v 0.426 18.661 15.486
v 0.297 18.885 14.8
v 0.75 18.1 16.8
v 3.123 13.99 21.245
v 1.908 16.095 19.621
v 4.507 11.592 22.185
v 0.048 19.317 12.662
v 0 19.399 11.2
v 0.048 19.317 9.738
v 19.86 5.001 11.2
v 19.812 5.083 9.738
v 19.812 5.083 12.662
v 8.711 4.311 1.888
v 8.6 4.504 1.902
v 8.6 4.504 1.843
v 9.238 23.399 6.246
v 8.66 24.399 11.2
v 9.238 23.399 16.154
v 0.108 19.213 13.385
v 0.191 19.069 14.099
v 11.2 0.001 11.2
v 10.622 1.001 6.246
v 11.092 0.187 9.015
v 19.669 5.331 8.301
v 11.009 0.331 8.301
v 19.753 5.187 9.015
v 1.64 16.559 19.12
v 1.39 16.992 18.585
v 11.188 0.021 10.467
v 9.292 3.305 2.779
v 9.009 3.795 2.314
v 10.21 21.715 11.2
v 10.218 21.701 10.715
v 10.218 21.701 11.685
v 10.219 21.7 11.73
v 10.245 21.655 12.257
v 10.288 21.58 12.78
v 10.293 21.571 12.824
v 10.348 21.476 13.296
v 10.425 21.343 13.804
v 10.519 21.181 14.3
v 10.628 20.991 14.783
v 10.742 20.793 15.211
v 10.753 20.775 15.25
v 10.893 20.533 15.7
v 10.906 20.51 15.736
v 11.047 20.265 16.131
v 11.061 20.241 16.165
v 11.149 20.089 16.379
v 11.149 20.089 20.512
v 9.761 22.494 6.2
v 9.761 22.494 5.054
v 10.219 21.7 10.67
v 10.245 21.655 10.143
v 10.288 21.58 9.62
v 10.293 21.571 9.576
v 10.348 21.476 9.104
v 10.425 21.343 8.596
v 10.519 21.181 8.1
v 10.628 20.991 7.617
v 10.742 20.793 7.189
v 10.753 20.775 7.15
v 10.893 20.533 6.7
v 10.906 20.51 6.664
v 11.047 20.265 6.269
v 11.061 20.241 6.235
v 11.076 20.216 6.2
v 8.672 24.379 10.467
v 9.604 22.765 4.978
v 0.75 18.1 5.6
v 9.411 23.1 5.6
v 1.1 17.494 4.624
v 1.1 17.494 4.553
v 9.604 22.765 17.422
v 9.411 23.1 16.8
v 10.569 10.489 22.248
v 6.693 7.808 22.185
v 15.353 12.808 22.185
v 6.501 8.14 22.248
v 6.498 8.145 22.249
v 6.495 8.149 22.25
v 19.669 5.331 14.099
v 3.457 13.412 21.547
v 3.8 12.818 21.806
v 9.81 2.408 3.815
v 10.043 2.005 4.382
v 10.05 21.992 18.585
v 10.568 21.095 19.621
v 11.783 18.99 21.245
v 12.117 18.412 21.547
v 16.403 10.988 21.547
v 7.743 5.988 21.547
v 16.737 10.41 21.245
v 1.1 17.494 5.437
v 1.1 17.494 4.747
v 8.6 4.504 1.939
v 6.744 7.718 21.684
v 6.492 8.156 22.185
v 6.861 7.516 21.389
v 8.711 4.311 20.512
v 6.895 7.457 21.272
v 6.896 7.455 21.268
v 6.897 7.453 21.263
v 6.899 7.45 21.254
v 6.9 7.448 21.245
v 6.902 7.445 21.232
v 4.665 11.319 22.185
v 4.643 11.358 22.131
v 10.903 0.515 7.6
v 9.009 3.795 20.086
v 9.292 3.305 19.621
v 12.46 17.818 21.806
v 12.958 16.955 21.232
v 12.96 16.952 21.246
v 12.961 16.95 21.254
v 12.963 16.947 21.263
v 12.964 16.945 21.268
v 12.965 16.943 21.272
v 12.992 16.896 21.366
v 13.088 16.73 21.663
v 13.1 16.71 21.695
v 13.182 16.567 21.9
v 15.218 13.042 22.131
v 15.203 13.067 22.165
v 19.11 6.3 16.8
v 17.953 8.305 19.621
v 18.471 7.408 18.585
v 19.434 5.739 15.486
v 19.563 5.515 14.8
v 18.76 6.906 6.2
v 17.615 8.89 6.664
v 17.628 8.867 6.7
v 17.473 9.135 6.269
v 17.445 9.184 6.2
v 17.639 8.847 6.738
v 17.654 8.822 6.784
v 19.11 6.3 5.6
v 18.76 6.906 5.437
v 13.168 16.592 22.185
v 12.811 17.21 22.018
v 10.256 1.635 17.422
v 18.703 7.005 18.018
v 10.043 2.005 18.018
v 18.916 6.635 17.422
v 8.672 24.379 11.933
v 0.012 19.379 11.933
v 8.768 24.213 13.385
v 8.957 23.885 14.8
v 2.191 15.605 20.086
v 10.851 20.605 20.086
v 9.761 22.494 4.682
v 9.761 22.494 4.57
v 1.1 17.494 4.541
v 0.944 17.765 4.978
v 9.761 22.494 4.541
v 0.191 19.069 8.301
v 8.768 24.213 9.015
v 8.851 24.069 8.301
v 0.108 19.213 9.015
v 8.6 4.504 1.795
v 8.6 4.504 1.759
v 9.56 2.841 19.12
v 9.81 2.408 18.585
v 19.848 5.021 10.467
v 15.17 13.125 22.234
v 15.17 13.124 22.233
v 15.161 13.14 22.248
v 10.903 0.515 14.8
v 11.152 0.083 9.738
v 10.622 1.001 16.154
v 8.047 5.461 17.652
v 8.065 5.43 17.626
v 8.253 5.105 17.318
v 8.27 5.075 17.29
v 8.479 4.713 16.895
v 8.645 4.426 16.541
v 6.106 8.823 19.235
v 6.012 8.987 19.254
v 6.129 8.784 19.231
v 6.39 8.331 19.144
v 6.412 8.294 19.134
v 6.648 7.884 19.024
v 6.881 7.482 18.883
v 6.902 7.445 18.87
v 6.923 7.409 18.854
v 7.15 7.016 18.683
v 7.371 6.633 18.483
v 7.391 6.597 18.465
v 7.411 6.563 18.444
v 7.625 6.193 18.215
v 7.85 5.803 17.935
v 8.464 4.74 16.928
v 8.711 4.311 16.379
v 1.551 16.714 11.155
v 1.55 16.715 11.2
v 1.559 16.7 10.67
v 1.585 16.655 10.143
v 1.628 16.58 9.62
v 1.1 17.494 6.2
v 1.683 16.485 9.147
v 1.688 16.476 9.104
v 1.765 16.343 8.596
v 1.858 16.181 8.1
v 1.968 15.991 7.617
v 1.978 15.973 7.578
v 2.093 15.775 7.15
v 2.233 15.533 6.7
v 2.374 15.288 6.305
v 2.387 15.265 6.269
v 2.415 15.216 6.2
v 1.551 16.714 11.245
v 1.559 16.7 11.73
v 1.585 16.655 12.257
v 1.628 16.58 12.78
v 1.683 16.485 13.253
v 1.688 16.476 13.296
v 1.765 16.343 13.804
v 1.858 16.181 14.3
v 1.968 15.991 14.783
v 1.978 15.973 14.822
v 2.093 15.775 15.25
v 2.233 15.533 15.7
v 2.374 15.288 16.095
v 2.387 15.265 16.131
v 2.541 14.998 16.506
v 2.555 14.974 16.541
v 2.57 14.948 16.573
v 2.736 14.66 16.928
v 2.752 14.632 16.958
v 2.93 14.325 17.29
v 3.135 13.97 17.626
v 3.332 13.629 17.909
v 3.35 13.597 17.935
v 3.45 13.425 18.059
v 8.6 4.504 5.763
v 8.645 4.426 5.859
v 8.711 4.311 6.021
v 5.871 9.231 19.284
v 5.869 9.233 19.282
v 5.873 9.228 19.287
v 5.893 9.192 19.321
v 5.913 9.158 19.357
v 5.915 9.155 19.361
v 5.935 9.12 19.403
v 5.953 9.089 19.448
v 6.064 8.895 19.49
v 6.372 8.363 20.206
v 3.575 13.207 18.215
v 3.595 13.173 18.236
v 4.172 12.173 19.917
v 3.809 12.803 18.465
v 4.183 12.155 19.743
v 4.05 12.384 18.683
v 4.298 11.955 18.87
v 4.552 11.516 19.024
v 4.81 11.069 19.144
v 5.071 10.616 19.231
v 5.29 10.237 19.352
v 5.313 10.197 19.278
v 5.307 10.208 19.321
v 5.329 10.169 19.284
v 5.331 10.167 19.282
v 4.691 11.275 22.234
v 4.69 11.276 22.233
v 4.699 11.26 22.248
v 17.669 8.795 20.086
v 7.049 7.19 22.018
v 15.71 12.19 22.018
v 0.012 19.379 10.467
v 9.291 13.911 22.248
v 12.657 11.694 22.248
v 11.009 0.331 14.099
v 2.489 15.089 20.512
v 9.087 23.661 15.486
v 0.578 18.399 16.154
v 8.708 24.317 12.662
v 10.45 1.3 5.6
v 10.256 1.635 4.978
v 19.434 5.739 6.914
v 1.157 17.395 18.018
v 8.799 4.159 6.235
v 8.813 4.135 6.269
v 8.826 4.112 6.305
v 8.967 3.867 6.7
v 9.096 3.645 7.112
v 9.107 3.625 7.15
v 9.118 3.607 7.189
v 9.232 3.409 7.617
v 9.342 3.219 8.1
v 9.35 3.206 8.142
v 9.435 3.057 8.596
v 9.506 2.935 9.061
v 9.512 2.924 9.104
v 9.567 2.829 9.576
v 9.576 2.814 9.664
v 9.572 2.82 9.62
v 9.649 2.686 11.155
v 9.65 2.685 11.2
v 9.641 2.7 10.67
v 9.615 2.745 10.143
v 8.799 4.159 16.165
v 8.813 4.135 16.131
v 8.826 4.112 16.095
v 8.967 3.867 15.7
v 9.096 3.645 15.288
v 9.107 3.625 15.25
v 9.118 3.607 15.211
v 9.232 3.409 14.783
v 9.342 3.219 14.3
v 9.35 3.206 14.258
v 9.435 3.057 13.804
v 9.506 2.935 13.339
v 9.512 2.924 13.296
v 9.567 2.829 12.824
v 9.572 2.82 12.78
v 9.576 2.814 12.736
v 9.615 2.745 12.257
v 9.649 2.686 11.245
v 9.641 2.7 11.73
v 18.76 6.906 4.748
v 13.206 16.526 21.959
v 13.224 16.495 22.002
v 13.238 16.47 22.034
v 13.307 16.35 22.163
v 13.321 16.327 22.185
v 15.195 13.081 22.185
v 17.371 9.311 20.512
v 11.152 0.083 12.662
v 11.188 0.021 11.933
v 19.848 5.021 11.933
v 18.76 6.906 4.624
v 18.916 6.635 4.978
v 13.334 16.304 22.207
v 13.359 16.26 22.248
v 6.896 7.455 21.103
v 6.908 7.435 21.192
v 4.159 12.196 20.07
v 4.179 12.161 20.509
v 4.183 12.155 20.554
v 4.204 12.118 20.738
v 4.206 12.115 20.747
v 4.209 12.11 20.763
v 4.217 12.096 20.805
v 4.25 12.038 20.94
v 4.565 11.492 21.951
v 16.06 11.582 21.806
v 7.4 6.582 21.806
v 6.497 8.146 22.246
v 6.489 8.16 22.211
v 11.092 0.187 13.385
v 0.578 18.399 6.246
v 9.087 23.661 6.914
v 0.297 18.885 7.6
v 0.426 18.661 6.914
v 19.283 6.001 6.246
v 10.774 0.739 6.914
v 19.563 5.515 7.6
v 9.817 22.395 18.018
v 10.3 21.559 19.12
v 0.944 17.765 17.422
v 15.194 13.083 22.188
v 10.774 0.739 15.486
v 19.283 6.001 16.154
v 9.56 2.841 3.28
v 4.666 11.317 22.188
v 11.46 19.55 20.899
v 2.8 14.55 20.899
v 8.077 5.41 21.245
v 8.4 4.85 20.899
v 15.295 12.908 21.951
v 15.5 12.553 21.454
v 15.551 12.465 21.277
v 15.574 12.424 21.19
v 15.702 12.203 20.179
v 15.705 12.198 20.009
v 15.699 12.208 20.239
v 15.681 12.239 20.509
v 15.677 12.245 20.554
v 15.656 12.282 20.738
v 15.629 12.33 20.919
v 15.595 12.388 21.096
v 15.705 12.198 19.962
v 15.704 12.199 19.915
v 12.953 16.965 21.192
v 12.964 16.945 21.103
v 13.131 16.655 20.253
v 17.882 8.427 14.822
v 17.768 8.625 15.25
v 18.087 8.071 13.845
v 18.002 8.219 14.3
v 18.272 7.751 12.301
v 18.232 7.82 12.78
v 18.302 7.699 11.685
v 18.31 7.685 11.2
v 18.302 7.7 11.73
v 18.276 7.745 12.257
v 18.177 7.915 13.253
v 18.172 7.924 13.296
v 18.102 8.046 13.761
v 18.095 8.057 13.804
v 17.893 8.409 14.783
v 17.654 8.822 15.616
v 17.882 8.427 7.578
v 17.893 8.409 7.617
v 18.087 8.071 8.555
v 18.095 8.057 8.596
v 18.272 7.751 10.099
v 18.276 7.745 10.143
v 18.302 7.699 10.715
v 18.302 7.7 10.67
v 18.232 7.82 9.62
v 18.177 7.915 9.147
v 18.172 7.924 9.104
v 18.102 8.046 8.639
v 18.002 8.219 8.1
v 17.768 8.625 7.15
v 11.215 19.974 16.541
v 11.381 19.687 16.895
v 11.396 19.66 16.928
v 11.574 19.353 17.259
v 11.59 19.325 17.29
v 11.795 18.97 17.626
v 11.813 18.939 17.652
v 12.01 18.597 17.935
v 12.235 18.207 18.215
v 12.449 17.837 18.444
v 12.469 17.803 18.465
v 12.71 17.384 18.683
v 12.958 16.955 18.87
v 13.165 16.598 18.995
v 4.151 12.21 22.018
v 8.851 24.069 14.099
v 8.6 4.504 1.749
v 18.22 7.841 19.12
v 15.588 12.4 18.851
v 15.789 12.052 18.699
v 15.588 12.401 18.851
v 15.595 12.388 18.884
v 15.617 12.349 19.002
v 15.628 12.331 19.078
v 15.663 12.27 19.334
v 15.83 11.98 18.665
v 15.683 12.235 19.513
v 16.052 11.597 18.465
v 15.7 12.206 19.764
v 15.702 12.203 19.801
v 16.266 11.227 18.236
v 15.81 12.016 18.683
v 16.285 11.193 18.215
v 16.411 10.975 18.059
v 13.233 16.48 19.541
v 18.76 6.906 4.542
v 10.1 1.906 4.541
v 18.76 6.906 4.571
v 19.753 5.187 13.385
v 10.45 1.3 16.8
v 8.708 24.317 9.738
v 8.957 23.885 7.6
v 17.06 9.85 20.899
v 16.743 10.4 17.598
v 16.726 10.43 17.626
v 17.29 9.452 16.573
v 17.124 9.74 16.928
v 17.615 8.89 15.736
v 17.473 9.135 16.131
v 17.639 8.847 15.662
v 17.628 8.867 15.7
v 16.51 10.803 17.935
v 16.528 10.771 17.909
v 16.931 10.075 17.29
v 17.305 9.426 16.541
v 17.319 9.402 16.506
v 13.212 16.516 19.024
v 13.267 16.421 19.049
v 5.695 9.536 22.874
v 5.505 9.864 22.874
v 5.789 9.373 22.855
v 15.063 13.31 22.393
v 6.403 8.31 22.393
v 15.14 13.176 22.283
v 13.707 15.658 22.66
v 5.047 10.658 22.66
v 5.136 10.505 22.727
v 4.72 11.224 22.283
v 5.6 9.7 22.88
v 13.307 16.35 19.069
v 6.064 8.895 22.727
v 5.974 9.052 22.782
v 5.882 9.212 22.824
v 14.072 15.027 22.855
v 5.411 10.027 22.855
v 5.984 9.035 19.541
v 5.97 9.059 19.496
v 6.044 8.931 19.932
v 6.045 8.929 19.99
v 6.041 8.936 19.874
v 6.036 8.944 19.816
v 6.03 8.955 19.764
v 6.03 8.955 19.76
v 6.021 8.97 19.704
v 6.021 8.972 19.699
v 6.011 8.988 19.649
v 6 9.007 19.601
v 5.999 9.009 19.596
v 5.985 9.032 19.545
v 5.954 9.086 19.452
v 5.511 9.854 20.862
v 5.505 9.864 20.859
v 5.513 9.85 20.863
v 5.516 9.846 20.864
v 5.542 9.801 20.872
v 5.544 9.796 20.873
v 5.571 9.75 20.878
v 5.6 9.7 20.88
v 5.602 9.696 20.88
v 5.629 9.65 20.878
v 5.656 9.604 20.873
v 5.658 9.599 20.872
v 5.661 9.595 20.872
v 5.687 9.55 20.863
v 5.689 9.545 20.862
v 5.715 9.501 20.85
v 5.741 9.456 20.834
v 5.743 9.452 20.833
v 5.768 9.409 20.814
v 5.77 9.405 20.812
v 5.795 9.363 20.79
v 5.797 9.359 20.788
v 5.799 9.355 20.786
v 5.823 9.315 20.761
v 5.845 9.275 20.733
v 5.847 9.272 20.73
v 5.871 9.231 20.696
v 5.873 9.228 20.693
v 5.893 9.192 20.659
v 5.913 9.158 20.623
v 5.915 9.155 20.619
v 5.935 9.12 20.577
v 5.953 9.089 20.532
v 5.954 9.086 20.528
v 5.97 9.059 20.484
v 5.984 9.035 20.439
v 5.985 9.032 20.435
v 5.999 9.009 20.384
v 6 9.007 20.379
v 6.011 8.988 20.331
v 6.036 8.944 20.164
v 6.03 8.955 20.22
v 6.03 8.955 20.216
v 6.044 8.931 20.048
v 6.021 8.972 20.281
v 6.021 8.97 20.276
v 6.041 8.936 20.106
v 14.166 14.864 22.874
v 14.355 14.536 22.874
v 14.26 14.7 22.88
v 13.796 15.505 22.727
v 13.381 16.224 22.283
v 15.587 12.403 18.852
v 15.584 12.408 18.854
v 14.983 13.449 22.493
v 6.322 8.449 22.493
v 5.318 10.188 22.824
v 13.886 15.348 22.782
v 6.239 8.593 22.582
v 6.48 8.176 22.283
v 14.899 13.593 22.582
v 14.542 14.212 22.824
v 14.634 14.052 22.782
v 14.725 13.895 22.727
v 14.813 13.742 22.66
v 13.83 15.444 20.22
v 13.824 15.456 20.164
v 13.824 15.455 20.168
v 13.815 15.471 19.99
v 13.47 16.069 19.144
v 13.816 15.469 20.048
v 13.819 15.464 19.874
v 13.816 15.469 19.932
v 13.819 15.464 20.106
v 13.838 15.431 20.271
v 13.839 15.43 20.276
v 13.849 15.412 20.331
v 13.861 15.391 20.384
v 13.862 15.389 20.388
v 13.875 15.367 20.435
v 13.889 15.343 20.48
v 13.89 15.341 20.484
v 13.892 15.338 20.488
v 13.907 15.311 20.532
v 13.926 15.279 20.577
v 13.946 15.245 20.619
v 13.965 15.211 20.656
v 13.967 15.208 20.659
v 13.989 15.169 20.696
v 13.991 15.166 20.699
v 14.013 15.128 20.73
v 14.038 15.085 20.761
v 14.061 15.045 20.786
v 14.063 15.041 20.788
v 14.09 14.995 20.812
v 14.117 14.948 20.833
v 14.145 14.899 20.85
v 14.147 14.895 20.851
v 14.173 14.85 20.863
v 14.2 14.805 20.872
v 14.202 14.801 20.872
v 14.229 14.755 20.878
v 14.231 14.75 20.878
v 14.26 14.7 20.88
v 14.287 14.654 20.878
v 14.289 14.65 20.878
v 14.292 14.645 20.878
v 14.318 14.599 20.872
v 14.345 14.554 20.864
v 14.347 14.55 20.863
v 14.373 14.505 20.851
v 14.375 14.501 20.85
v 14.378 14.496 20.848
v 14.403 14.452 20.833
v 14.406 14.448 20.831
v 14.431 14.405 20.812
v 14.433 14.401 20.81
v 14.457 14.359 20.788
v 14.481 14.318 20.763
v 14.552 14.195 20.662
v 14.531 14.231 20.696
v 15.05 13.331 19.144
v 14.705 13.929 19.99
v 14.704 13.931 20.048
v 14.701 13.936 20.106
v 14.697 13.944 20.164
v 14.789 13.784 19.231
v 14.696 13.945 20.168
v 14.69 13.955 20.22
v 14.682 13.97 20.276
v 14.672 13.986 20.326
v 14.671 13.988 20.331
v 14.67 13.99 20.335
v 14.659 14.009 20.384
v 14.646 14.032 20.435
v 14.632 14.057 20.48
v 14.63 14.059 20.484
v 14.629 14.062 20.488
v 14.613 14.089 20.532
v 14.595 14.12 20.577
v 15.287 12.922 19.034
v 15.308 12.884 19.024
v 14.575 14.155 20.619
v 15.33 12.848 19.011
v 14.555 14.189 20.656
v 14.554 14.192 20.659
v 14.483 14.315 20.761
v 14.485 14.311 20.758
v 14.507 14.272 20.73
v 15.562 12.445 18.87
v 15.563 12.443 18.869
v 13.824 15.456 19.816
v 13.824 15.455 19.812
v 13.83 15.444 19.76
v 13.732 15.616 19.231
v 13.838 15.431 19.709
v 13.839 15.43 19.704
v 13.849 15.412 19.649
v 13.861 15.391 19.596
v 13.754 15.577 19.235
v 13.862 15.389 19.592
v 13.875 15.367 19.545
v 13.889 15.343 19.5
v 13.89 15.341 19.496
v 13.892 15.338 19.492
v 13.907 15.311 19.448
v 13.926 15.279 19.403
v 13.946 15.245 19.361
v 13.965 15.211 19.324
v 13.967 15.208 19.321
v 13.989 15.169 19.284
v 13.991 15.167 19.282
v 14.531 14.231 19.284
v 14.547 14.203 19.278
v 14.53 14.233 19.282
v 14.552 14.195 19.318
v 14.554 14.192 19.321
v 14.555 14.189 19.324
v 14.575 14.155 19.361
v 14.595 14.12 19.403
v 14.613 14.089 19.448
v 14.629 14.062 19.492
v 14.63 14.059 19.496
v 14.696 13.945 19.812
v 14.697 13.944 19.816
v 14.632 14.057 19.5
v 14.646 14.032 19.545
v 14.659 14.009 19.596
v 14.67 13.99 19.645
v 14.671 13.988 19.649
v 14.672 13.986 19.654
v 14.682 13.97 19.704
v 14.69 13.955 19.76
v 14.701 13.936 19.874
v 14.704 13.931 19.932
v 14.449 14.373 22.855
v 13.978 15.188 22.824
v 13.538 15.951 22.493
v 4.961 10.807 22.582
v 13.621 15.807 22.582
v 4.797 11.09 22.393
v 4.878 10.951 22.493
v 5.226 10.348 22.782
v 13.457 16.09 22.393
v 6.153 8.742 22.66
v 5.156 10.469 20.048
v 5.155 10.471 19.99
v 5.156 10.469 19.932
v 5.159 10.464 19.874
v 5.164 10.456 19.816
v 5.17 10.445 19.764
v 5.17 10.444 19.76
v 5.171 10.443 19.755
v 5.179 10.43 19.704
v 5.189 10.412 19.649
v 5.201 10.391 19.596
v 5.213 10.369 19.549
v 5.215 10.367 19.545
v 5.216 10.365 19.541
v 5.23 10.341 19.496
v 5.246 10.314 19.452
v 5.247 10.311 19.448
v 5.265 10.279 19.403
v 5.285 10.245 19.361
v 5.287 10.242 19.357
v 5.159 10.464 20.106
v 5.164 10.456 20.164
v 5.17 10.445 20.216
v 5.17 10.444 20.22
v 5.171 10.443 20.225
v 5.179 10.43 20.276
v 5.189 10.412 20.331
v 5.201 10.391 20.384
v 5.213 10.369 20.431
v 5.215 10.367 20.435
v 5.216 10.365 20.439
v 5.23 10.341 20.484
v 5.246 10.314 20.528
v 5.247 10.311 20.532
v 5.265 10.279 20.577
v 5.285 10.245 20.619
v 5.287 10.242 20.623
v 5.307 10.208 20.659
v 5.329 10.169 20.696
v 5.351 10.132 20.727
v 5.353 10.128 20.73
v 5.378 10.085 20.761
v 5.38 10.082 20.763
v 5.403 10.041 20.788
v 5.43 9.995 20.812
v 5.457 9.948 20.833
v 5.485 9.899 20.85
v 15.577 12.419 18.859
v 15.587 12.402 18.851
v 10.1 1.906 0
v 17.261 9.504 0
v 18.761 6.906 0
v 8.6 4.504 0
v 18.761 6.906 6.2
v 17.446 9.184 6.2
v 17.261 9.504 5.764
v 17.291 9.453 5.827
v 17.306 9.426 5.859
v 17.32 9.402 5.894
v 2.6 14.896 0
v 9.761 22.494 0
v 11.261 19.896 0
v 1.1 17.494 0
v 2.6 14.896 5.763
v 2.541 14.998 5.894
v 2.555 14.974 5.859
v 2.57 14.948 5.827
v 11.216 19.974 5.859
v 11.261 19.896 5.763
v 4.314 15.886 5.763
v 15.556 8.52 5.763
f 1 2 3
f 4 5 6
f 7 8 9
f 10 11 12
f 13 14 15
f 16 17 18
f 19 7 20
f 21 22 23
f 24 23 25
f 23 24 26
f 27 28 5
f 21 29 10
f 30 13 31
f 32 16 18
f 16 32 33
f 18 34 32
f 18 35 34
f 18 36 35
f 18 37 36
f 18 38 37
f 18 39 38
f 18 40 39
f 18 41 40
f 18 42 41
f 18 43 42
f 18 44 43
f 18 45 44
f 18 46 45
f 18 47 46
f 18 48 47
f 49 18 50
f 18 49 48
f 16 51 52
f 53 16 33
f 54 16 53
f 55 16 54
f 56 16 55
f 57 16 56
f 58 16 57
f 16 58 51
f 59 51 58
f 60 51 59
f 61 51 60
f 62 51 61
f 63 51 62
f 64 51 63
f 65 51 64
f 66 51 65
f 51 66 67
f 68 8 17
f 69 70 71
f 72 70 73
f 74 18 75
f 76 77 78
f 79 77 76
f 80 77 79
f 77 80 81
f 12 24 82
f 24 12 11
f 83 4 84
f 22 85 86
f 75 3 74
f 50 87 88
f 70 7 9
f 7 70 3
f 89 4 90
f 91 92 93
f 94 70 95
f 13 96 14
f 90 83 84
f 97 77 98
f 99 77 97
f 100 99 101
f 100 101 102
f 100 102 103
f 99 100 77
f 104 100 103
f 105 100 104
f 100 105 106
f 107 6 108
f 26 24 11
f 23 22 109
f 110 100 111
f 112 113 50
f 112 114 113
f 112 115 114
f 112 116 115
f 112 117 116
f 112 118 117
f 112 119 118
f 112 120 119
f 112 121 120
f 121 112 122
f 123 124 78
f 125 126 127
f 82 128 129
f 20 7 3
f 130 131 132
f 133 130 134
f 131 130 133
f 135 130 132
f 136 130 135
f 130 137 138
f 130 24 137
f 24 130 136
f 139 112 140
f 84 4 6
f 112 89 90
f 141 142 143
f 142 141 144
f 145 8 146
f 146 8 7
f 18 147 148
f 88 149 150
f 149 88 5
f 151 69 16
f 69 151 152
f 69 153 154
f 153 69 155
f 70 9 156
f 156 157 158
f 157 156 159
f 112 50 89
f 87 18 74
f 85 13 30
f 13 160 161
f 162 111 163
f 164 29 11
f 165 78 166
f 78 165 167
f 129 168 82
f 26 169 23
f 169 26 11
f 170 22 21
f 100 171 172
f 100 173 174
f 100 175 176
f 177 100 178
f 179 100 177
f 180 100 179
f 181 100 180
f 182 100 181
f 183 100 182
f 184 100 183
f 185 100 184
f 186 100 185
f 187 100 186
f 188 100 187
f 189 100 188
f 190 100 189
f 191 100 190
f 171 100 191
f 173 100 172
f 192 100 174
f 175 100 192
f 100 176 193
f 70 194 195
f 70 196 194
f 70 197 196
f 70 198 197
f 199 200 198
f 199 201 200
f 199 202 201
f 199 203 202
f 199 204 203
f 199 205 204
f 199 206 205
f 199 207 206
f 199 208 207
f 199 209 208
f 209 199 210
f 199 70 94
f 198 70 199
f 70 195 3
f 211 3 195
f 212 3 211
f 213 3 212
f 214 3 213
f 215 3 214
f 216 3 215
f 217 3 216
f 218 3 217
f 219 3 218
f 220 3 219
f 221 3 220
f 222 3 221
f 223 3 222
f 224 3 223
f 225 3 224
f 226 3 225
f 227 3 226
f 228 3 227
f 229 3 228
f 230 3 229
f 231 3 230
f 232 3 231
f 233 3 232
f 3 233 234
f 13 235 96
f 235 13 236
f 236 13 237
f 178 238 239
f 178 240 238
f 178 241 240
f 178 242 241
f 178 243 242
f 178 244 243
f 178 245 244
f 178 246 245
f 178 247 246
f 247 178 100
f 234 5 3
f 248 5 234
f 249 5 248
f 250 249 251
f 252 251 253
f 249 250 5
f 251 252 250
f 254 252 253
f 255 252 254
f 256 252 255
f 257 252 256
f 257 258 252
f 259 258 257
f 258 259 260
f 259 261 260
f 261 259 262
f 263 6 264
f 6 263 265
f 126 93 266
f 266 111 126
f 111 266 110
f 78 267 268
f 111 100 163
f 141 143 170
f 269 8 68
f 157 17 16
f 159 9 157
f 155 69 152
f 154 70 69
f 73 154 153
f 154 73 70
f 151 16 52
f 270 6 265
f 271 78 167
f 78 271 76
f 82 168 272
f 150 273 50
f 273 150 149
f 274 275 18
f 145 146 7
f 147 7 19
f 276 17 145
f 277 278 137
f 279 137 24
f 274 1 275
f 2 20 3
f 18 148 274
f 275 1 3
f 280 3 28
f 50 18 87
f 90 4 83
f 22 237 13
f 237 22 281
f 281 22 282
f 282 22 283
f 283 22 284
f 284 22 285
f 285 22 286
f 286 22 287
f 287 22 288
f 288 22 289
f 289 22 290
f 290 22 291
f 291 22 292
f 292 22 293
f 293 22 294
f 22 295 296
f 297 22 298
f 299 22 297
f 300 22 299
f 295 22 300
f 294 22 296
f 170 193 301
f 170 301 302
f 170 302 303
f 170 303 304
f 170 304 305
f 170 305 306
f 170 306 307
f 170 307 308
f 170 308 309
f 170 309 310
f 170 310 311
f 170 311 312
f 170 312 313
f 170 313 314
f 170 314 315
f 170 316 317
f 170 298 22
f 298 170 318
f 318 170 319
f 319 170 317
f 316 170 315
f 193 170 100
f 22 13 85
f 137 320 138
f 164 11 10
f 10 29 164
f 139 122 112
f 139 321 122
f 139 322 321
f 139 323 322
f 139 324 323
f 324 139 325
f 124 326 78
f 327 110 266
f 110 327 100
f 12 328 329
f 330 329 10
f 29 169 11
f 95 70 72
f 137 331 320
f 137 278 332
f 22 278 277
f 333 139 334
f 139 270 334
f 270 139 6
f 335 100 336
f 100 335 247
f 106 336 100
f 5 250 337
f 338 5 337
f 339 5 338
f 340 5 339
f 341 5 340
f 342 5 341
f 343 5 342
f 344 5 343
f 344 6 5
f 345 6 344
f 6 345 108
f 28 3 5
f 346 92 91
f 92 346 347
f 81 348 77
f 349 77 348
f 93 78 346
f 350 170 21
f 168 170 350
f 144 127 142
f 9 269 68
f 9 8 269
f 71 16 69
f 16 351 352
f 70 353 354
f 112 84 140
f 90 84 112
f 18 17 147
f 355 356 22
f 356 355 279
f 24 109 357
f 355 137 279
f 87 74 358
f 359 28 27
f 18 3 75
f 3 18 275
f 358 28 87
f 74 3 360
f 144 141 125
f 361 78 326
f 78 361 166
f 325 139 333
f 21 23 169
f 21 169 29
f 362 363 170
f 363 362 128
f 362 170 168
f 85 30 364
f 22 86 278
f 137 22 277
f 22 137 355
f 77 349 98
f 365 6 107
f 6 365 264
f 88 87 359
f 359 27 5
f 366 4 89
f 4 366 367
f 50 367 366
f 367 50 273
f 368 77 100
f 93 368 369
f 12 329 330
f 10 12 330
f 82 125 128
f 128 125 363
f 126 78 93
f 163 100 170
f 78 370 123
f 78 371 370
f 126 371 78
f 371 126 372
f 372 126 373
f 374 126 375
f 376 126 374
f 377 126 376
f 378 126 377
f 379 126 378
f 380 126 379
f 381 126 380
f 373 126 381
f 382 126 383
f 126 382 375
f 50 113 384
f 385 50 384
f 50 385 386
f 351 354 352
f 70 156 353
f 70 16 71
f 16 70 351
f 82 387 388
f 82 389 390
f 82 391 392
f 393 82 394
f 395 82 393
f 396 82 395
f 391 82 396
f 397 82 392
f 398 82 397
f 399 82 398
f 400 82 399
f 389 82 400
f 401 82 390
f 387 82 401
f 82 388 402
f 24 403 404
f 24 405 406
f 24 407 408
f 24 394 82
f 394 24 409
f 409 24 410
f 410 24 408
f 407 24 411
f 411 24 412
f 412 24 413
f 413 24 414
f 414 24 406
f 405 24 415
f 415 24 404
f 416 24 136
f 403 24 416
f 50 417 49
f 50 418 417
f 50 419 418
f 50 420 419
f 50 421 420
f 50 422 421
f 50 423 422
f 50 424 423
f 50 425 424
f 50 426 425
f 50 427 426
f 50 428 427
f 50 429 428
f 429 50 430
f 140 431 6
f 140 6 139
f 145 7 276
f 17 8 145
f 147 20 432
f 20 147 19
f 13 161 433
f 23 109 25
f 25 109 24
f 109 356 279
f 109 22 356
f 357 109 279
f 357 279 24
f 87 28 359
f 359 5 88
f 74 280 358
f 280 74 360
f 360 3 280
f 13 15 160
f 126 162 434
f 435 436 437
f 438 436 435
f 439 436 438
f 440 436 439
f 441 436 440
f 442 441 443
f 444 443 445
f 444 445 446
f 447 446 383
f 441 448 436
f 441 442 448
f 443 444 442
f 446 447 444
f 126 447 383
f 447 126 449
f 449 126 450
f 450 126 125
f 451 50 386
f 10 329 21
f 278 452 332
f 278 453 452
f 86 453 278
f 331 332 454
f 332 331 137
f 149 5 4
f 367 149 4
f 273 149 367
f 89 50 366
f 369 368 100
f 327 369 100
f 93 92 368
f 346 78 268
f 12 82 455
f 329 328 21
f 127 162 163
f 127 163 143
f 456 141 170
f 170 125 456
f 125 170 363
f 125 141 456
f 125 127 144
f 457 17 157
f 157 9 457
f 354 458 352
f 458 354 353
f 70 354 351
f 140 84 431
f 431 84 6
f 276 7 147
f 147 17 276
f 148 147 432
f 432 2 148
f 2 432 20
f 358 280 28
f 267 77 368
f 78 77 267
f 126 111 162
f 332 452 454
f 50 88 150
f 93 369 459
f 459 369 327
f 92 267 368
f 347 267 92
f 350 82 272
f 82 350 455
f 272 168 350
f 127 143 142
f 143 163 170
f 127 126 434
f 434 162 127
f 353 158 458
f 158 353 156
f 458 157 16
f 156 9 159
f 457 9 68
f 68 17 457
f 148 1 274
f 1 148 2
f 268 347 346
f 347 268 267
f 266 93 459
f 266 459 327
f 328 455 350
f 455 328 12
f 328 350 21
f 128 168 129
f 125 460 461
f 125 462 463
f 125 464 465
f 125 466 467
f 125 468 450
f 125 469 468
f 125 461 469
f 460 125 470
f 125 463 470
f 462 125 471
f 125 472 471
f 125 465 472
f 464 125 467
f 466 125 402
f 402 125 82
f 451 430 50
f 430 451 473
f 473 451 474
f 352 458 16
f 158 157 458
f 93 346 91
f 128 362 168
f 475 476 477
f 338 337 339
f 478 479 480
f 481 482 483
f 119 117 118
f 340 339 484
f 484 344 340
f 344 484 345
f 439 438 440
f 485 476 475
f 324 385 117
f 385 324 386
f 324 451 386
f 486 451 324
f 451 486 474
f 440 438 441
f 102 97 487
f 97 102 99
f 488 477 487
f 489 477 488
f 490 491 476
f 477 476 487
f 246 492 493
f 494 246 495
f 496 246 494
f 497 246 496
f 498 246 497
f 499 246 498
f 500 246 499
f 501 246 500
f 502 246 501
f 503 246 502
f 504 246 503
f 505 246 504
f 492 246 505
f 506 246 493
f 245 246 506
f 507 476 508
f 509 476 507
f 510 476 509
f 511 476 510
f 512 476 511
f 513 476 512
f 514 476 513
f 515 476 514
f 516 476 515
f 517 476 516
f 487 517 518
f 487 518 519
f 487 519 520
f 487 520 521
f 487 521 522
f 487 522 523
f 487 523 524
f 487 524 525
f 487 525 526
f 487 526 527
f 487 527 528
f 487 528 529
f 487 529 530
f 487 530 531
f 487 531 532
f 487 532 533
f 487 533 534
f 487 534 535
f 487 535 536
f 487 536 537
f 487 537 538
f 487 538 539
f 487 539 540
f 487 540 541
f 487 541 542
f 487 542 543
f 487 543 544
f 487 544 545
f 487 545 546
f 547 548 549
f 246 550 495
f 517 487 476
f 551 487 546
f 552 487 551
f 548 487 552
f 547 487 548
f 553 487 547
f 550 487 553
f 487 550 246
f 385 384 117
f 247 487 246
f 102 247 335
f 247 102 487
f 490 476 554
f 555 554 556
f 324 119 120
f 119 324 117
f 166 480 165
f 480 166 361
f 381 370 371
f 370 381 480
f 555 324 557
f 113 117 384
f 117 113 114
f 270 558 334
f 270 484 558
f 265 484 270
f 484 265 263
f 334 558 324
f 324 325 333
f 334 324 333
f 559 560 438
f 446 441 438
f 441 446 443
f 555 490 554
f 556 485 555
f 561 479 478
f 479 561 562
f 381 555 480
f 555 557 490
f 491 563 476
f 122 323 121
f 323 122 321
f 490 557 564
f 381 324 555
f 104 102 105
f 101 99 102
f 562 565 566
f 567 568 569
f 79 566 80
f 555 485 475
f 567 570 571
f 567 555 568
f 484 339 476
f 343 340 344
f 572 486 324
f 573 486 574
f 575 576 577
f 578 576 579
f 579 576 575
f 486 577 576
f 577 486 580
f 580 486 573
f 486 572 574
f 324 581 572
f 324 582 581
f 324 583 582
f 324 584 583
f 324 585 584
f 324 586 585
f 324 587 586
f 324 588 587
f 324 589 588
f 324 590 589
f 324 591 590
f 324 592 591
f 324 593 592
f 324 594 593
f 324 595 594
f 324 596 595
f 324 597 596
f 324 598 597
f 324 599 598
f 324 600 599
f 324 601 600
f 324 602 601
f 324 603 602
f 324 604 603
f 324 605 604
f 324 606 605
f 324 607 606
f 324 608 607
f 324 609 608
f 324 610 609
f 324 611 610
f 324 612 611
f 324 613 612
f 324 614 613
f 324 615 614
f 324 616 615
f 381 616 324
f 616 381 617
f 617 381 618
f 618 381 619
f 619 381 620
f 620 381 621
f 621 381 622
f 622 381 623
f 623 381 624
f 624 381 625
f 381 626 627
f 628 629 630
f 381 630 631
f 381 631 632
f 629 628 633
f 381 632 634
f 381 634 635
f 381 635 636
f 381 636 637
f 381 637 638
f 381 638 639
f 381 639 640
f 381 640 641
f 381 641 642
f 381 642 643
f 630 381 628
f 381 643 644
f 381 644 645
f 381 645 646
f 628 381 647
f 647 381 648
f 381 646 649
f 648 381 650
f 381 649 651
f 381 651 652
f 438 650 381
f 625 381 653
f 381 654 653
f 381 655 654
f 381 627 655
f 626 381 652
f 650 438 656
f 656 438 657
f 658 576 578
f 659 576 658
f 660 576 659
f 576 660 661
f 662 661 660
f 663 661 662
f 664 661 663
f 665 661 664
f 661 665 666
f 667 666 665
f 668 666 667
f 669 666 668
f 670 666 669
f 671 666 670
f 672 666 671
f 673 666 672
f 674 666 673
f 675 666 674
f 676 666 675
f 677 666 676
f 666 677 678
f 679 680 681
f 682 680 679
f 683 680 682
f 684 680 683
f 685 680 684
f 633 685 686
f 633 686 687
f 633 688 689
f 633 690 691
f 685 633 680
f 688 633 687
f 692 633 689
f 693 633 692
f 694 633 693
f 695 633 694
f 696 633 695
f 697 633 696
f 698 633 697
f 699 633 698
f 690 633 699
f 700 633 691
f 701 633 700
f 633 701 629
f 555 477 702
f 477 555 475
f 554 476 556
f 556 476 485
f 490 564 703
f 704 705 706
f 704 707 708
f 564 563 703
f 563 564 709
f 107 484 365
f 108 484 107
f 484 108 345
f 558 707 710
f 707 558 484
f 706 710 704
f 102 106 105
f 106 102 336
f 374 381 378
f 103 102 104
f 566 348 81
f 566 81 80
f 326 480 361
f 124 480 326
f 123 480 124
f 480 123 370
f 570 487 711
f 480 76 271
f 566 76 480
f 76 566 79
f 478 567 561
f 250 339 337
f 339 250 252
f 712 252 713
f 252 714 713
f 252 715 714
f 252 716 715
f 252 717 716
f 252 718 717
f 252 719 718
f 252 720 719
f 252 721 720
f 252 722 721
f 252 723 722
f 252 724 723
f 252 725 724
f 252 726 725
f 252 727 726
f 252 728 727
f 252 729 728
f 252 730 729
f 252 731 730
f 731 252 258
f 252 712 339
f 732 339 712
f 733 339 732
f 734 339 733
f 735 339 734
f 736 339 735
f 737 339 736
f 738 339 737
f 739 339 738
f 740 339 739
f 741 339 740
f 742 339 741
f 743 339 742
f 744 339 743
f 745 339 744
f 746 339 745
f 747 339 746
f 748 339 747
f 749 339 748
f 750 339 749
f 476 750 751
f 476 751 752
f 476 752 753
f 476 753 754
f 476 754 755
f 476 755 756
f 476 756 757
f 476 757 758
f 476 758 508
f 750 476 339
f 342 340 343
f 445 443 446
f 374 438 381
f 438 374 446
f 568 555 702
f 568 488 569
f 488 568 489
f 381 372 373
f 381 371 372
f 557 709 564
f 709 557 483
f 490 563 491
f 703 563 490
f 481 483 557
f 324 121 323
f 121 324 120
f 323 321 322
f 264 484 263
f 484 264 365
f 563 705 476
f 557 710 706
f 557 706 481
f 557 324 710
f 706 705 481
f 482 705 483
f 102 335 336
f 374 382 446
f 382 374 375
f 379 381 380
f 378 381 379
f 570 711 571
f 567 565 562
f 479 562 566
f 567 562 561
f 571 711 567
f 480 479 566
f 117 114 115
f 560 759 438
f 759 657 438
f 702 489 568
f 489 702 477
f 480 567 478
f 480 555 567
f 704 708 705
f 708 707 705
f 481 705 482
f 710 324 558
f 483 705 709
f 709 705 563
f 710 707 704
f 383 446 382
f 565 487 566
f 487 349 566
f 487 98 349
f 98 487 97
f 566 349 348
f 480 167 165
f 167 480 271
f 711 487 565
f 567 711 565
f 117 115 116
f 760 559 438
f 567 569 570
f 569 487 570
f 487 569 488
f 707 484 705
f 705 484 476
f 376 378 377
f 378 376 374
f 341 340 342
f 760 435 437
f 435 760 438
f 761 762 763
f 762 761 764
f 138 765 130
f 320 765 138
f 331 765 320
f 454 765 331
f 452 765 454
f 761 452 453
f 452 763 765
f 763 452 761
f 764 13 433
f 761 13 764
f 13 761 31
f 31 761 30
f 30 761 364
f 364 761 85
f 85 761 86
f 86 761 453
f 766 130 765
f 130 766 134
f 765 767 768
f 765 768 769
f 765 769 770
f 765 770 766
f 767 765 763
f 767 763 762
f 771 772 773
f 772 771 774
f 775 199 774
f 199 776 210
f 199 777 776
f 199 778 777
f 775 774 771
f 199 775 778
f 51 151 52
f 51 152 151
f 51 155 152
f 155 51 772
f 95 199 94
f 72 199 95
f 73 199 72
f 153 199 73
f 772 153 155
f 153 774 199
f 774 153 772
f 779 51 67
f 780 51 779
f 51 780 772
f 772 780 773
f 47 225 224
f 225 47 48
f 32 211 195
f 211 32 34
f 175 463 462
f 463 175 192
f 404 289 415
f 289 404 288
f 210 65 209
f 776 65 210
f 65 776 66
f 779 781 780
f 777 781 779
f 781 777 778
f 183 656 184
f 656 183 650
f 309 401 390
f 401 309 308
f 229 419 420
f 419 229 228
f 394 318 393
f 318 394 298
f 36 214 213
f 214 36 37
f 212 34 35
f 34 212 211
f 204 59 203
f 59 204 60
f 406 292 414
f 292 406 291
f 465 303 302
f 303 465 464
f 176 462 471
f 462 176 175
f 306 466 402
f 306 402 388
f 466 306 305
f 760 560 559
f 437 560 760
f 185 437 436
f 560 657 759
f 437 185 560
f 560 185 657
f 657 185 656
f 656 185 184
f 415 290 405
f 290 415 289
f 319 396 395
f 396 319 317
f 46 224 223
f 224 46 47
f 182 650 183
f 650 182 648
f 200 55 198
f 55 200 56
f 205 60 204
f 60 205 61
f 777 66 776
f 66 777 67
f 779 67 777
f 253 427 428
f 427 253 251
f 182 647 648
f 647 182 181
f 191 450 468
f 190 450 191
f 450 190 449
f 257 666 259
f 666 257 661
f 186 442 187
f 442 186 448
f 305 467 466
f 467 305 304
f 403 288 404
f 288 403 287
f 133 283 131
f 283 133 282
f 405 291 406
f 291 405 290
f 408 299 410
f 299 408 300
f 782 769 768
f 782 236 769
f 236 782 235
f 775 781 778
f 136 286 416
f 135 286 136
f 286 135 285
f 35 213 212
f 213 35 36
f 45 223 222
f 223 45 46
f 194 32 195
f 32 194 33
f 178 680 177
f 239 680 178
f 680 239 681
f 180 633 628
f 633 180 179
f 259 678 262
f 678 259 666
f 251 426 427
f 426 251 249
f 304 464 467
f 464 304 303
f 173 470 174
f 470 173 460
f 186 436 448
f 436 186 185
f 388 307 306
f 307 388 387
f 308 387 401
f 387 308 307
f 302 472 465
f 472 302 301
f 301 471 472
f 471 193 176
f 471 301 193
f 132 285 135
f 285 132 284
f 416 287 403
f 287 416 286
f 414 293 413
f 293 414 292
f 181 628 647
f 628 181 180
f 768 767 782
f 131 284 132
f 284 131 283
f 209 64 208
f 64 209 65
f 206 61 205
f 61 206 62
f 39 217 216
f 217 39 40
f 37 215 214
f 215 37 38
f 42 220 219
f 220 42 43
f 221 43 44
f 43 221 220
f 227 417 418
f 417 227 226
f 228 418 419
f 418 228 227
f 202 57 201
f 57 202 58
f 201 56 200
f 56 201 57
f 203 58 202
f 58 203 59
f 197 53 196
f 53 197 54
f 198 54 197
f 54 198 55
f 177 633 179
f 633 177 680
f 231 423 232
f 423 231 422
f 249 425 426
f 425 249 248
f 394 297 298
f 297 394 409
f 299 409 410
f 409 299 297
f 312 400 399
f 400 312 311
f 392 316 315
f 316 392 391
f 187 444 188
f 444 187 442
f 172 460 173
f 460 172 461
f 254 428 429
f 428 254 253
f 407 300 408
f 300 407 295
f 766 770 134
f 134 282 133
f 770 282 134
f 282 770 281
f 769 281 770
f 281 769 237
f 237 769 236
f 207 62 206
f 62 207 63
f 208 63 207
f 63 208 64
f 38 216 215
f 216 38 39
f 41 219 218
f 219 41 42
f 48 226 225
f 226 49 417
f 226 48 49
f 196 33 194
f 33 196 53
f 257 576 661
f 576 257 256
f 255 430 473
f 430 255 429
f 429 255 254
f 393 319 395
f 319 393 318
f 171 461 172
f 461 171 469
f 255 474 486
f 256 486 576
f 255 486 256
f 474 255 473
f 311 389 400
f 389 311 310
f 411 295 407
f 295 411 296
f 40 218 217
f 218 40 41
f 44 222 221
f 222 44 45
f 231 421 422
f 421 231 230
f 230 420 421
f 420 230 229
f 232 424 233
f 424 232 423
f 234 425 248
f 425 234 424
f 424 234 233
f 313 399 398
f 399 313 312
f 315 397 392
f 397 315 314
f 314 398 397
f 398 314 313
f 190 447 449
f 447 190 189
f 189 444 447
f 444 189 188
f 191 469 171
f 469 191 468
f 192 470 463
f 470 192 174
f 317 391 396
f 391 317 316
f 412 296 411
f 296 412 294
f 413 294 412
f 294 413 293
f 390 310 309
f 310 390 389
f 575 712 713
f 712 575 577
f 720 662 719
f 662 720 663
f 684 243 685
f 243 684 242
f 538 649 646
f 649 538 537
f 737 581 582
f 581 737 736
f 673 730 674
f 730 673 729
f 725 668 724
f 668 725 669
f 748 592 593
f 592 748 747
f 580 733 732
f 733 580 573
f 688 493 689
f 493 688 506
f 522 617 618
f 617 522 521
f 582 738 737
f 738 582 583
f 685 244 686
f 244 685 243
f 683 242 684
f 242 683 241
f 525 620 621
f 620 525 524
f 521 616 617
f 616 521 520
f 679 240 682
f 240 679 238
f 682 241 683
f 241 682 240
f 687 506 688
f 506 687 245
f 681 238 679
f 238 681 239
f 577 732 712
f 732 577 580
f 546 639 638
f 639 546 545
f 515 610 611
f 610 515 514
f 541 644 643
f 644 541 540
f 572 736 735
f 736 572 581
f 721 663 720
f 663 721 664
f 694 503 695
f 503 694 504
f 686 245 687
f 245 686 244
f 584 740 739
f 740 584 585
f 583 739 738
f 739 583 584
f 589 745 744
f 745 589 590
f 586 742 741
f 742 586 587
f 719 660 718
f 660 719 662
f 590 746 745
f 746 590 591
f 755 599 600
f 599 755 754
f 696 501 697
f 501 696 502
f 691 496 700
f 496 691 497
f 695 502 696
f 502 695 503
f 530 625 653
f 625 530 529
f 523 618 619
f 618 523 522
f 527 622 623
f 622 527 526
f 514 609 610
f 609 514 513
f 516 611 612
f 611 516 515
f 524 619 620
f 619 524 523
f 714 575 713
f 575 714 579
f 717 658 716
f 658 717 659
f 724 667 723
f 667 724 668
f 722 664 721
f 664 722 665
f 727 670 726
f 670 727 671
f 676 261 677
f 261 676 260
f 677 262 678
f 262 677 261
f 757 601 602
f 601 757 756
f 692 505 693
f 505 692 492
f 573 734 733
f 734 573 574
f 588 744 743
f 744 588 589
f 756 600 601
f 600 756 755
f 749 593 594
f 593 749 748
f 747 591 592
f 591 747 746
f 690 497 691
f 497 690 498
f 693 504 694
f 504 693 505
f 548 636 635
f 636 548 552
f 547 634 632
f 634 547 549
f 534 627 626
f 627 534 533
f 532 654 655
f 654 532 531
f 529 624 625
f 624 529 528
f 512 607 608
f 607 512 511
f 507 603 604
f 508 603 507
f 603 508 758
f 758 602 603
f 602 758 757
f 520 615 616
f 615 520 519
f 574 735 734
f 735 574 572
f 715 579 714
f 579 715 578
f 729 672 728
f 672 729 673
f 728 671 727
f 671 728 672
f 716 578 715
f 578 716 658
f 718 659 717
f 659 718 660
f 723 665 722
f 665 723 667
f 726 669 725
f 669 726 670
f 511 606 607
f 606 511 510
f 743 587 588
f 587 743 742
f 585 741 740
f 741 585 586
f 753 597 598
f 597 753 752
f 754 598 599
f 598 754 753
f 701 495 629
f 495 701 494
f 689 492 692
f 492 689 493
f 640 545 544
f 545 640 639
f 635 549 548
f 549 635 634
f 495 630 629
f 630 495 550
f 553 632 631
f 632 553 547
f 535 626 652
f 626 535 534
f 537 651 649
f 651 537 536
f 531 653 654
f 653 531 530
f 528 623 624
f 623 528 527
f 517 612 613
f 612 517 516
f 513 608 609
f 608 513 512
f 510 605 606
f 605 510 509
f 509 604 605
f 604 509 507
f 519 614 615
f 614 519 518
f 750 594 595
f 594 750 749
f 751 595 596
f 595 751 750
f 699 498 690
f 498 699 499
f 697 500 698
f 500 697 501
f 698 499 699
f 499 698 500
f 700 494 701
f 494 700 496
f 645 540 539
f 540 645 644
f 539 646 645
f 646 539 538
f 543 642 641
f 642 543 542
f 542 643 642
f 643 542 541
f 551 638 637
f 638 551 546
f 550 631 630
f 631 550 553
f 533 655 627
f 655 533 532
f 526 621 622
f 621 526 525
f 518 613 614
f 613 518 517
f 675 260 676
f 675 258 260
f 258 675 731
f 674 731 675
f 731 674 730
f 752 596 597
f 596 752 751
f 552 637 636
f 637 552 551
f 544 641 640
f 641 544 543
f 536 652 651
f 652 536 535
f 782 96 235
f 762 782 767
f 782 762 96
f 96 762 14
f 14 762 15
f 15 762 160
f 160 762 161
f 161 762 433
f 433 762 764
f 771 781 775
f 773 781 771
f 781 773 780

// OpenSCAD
// Wire clip (clip) for 137 MHz V-dipole for weather satellites
// PETG, 0.2 mm layers, 4 walls, 60% infill, no supports
// Print it: as modelled: lying on its side, the open mouth down, standing on its two flat feet; no supports (the top of the bore bridges)
// Generated by the blueprint skill from the plan at its current size. Units: mm.
$fn = 96;
translate([-132.496, -70.03, -1002.5])
difference() {
  union() {
    translate([138.096, 79.73, 1013.7]) rotate([0, 90.000, 30.000]) translate([0, 0, 0]) cylinder(h = 10.000, r = 11.200);
    translate([138.096, 79.73, 1022.49]) rotate([0, 90.000, 30.000]) translate([0, 0, 0]) cylinder(h = 10.000, r = 2.890);
    translate([0, 0, 1002.500]) linear_extrude(height = 6.200) polygon([[140.596,75.4],[149.257,80.4],[151.257,76.936],[142.596,71.936]]);
    translate([0, 0, 1002.500]) linear_extrude(height = 6.200) polygon([[135.596,84.06],[144.257,89.06],[142.257,92.524],[133.596,87.524]]);
  }
  translate([137.23, 79.23, 1013.7]) rotate([0, 90.000, 30.000]) translate([0, 0, -0.01]) cylinder(h = 12.020, r = 8.100);
  translate([137.23, 79.23, 1022.49]) rotate([0, 90.000, 30.000]) translate([0, 0, -0.01]) cylinder(h = 12.020, r = 0.890);
  translate([0, 0, 1001.490]) linear_extrude(height = 6.931) polygon([[140.663,74.284],[150.19,79.784],[144.19,90.176],[134.663,84.676]]);
}
